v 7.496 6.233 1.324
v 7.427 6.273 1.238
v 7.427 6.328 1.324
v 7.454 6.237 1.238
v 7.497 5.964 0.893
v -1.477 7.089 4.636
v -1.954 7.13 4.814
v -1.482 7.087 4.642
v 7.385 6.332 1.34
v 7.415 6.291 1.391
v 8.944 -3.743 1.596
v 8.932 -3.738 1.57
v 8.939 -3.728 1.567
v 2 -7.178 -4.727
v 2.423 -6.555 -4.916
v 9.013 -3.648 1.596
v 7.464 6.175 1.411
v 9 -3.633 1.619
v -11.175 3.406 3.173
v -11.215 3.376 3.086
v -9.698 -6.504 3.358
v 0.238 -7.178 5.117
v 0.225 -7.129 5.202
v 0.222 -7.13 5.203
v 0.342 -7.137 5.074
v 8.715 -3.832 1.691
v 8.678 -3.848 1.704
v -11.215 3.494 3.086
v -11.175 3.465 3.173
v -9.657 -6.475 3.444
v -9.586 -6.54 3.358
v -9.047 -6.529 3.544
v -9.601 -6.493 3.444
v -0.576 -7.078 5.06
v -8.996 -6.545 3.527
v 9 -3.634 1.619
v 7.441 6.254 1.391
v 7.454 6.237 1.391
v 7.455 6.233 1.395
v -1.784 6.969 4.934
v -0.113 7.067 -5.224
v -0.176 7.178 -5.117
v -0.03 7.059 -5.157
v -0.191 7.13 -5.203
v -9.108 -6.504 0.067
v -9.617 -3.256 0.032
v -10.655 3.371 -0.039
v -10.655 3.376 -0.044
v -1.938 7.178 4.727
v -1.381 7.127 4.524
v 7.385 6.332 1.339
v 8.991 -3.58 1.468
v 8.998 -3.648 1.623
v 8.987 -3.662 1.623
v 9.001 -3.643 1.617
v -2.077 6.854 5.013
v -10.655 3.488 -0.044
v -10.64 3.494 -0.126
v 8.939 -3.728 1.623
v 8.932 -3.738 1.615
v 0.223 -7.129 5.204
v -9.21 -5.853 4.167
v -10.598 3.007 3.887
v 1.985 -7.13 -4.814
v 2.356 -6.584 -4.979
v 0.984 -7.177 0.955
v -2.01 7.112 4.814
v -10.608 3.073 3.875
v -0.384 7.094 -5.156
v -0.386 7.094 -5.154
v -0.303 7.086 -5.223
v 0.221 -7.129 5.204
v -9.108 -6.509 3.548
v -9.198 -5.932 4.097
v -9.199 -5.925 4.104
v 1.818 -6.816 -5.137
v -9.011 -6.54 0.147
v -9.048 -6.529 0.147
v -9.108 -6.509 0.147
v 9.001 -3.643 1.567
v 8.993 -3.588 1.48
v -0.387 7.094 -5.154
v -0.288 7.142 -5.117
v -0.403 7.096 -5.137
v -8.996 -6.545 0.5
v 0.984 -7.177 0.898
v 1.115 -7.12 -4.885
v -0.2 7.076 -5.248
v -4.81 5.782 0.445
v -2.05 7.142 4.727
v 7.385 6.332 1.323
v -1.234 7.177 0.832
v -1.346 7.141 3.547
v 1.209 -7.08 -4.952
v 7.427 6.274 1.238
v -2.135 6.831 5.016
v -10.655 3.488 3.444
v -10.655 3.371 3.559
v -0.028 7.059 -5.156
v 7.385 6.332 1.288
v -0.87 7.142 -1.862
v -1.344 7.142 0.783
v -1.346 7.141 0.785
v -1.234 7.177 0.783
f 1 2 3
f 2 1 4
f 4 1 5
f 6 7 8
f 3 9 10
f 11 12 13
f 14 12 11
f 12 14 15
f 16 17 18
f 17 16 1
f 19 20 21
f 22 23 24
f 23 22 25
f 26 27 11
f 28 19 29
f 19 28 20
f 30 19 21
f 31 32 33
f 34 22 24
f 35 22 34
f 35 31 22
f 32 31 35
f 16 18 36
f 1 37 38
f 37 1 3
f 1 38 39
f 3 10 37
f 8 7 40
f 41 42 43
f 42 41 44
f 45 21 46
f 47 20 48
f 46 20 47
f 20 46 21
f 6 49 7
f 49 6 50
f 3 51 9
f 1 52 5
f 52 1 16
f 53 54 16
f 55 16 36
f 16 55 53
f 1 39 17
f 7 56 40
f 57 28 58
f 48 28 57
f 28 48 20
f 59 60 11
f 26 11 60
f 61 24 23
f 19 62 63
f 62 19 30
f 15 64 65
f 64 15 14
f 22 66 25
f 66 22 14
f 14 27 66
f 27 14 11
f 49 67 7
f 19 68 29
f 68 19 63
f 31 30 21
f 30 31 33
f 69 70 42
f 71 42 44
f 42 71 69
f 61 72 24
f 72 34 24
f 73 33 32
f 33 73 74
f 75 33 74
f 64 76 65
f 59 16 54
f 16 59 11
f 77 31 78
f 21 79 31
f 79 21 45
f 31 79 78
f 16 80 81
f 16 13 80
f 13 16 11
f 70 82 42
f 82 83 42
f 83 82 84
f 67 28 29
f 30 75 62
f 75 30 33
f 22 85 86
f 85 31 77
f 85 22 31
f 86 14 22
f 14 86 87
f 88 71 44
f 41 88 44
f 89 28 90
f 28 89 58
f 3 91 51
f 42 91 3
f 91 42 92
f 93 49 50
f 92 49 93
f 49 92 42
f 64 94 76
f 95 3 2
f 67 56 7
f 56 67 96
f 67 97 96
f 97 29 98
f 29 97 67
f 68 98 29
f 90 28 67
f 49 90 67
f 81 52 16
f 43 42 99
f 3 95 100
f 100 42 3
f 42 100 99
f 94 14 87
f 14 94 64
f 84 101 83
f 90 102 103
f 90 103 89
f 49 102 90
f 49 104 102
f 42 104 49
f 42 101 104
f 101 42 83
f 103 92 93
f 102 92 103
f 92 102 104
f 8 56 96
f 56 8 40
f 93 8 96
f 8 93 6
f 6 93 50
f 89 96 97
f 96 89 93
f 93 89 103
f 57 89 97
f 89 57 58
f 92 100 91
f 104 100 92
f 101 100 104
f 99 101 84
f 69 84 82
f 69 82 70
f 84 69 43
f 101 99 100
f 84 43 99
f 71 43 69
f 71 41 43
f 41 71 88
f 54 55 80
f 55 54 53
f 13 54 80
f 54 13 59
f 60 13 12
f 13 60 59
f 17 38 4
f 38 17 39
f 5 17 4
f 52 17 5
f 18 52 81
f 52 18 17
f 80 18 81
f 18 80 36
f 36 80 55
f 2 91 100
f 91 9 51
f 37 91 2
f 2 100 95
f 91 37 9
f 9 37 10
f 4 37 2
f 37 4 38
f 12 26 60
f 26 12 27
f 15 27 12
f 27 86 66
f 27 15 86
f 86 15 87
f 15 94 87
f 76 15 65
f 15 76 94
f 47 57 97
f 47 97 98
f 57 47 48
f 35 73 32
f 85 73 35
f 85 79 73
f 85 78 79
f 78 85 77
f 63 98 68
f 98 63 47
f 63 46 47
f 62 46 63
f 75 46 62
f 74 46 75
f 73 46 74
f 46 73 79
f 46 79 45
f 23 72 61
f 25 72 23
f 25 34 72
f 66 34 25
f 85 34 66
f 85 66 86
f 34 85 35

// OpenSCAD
// Auto-generated OpenSCAD file

    inner_points = 10*[[0.09531931272834022, -0.708217768074746, 0.49999999999998035], [-0.1265027432556592, 0.7082076393294248, 0.5000000000000197], [0.09531931272830348, -0.7082177680747239, -0.5000000000000197], [-0.12650274325569594, 0.7082076393294469, -0.49999999999998035], [-0.9026819541698768, -0.6450238500956094, 0.5000000000000183], [-1.057403067527742, 0.34293433580159893, 0.5000000000000459], [-0.9026819541699135, -0.6450238500955873, -0.4999999999999816], [-1.0574030675277786, 0.3429343358016208, -0.4999999999999542], [-0.36429558422672353, -0.054614512027756246, 1.1012960420472895], [-0.36429558422680436, -0.054614512027707784, -1.1012960420472664], [0.5881683563647194, 0.09454795600494201, 0.8356590717223468], [0.5881683563646581, 0.09454795600497881, -0.835659071722387], [0.8901105540161008, -0.36426009223040756, -4.1278652498751285e-14], [0.7353894406582356, 0.6236980936668005, -1.3844723451608184e-14]];

    outer_points = 10*[[-0.02066955875502509, 0.7082734695712609, -0.5116521782007974], [0.19691489843267096, -0.7082734695712609, -0.47269409229648607], [-0.19691489843267096, 0.7082734695712609, 0.47269409229648607], [0.02066955875502509, -0.7082734695712609, 0.5116521782007974], [-0.9371950219503415, 0.34351113745696893, -0.6757543304875785], [-0.7854296381335247, -0.6445318169533729, -0.6485810252963166], [-1.1134403616279873, 0.34351113745696893, 0.308591940009705], [-0.9616749778111705, -0.6445318169533729, 0.33576524520096696], [-0.14917650894770007, -0.05441805639996789, -1.145519356688417], [-0.537373098980239, -0.05441805639996789, 1.022593946716898], [0.7416409844661176, 0.09422163776851929, -0.7161588615966802], [0.4470789505652881, 0.09422163776851929, 0.9289969197175875], [0.7395623441727243, 0.6232908947450454, 0.13241724022144047], [0.891327727989541, -0.36475205966529645, 0.15959054541270243]];

    // Convex hull for inner set (I)
    module inner_hull() {
        hull() {
            for (p = inner_points) {
                translate(p) sphere(r=0.1);
            }
        }
    }

    // Convex hull for outer set (O) minus inner hull (O \ I)
    module outer_minus_inner() {
        difference() {
            hull() {
                for (p = outer_points) {
                    translate(p) sphere(r=0.1);
                }
            }
            inner_hull(); // Subtract inner hull
        }
    }

    // Convex hull for outer set (O) minus all translated inner hulls
    module outer_minus_AllTranslationInner() {
        difference() {
            hull() {
                for (p = outer_points) {
                    translate(p) sphere(r=0.1);
                }
            }
            hull() {
                translate([0,0,50]) inner_hull();
                translate([0,0,-50]) inner_hull();
            }; // Subtract translated inner hulls
        }
    }

    // Difference between outer_minus_inner and outer_minus_AllTranslationInner
    module outer_minus_inner_diff() {
        difference() {
            // Outer minus inner
            difference() {
                hull() {
                    for (p = outer_points) {
                        translate(p) sphere(r=0.1);
                    }
                }
                inner_hull();
            }

            // Subtract Outer minus AllTranslationInner
            difference() {
                hull() {
                    for (p = outer_points) {
                        translate(p) sphere(r=0.1);
                    }
                }
                hull() {
                    translate([0,0,50]) inner_hull();
                    translate([0,0,-50]) inner_hull();
                };
            }
        }
    }

    // Rendering all with colors applied
    color([0, 1, 0, 1]) outer_minus_AllTranslationInner(); // Opaque green
    
